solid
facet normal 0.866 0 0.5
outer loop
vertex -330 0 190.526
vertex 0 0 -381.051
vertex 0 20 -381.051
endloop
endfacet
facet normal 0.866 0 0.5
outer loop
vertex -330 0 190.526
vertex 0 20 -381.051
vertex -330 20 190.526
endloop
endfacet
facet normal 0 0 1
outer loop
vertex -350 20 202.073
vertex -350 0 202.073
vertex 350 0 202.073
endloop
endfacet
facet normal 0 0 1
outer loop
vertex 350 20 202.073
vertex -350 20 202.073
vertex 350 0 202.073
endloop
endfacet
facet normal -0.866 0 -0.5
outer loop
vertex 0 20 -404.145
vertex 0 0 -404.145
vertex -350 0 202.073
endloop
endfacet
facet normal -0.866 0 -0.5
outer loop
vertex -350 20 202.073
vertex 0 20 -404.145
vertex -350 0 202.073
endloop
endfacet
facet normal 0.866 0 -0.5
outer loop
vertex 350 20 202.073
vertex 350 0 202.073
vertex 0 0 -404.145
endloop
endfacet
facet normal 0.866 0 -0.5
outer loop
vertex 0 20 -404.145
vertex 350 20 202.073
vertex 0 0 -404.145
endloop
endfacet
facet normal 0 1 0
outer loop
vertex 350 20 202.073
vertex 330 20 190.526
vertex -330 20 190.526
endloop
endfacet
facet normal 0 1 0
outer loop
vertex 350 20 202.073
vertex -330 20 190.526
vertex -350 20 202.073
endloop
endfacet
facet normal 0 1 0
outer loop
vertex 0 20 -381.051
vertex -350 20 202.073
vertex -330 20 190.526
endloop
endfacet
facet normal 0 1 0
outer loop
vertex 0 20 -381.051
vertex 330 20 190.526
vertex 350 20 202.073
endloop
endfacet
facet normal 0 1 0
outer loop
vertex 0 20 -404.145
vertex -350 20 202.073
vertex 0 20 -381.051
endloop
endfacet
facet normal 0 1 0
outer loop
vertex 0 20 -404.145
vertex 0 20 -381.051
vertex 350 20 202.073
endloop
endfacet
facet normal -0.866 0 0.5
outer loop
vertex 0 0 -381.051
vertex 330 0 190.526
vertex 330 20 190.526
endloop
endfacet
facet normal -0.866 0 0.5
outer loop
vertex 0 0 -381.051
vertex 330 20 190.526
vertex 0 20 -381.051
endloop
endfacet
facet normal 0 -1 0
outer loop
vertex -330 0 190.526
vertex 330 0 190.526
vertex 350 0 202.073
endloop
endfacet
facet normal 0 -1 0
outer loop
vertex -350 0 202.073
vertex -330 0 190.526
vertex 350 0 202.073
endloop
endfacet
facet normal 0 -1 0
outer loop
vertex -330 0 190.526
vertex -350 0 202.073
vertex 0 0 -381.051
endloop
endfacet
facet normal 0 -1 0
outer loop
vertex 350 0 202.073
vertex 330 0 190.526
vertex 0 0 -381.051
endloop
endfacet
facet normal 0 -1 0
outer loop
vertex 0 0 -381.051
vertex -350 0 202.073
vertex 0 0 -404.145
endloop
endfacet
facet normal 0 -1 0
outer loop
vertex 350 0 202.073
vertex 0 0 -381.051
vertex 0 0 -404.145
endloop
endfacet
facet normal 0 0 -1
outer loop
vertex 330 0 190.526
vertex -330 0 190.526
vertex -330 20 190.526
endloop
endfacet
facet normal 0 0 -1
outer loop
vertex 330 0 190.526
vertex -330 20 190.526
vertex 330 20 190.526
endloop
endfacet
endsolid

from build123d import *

# Parameters (mm, degrees)
BOSS_EXTRUDE1_DEPTH = 20


with BuildPart() as part:
    # Sketch1 → Boss-Extrude1 (new body)
    with BuildSketch(Plane(origin=(0, 0, 0), x_dir=(1, 0, 0), z_dir=(0, 1, 0))):
        Polygon((0, 404.145188433), (-350, -202.072594216), (350, -202.072594216), align=None)
        Polygon((0, 381.051177665), (-330, -190.525588833), (330, -190.525588833), align=None, mode=Mode.SUBTRACT)
    extrude(amount=BOSS_EXTRUDE1_DEPTH)


solid = part.part
